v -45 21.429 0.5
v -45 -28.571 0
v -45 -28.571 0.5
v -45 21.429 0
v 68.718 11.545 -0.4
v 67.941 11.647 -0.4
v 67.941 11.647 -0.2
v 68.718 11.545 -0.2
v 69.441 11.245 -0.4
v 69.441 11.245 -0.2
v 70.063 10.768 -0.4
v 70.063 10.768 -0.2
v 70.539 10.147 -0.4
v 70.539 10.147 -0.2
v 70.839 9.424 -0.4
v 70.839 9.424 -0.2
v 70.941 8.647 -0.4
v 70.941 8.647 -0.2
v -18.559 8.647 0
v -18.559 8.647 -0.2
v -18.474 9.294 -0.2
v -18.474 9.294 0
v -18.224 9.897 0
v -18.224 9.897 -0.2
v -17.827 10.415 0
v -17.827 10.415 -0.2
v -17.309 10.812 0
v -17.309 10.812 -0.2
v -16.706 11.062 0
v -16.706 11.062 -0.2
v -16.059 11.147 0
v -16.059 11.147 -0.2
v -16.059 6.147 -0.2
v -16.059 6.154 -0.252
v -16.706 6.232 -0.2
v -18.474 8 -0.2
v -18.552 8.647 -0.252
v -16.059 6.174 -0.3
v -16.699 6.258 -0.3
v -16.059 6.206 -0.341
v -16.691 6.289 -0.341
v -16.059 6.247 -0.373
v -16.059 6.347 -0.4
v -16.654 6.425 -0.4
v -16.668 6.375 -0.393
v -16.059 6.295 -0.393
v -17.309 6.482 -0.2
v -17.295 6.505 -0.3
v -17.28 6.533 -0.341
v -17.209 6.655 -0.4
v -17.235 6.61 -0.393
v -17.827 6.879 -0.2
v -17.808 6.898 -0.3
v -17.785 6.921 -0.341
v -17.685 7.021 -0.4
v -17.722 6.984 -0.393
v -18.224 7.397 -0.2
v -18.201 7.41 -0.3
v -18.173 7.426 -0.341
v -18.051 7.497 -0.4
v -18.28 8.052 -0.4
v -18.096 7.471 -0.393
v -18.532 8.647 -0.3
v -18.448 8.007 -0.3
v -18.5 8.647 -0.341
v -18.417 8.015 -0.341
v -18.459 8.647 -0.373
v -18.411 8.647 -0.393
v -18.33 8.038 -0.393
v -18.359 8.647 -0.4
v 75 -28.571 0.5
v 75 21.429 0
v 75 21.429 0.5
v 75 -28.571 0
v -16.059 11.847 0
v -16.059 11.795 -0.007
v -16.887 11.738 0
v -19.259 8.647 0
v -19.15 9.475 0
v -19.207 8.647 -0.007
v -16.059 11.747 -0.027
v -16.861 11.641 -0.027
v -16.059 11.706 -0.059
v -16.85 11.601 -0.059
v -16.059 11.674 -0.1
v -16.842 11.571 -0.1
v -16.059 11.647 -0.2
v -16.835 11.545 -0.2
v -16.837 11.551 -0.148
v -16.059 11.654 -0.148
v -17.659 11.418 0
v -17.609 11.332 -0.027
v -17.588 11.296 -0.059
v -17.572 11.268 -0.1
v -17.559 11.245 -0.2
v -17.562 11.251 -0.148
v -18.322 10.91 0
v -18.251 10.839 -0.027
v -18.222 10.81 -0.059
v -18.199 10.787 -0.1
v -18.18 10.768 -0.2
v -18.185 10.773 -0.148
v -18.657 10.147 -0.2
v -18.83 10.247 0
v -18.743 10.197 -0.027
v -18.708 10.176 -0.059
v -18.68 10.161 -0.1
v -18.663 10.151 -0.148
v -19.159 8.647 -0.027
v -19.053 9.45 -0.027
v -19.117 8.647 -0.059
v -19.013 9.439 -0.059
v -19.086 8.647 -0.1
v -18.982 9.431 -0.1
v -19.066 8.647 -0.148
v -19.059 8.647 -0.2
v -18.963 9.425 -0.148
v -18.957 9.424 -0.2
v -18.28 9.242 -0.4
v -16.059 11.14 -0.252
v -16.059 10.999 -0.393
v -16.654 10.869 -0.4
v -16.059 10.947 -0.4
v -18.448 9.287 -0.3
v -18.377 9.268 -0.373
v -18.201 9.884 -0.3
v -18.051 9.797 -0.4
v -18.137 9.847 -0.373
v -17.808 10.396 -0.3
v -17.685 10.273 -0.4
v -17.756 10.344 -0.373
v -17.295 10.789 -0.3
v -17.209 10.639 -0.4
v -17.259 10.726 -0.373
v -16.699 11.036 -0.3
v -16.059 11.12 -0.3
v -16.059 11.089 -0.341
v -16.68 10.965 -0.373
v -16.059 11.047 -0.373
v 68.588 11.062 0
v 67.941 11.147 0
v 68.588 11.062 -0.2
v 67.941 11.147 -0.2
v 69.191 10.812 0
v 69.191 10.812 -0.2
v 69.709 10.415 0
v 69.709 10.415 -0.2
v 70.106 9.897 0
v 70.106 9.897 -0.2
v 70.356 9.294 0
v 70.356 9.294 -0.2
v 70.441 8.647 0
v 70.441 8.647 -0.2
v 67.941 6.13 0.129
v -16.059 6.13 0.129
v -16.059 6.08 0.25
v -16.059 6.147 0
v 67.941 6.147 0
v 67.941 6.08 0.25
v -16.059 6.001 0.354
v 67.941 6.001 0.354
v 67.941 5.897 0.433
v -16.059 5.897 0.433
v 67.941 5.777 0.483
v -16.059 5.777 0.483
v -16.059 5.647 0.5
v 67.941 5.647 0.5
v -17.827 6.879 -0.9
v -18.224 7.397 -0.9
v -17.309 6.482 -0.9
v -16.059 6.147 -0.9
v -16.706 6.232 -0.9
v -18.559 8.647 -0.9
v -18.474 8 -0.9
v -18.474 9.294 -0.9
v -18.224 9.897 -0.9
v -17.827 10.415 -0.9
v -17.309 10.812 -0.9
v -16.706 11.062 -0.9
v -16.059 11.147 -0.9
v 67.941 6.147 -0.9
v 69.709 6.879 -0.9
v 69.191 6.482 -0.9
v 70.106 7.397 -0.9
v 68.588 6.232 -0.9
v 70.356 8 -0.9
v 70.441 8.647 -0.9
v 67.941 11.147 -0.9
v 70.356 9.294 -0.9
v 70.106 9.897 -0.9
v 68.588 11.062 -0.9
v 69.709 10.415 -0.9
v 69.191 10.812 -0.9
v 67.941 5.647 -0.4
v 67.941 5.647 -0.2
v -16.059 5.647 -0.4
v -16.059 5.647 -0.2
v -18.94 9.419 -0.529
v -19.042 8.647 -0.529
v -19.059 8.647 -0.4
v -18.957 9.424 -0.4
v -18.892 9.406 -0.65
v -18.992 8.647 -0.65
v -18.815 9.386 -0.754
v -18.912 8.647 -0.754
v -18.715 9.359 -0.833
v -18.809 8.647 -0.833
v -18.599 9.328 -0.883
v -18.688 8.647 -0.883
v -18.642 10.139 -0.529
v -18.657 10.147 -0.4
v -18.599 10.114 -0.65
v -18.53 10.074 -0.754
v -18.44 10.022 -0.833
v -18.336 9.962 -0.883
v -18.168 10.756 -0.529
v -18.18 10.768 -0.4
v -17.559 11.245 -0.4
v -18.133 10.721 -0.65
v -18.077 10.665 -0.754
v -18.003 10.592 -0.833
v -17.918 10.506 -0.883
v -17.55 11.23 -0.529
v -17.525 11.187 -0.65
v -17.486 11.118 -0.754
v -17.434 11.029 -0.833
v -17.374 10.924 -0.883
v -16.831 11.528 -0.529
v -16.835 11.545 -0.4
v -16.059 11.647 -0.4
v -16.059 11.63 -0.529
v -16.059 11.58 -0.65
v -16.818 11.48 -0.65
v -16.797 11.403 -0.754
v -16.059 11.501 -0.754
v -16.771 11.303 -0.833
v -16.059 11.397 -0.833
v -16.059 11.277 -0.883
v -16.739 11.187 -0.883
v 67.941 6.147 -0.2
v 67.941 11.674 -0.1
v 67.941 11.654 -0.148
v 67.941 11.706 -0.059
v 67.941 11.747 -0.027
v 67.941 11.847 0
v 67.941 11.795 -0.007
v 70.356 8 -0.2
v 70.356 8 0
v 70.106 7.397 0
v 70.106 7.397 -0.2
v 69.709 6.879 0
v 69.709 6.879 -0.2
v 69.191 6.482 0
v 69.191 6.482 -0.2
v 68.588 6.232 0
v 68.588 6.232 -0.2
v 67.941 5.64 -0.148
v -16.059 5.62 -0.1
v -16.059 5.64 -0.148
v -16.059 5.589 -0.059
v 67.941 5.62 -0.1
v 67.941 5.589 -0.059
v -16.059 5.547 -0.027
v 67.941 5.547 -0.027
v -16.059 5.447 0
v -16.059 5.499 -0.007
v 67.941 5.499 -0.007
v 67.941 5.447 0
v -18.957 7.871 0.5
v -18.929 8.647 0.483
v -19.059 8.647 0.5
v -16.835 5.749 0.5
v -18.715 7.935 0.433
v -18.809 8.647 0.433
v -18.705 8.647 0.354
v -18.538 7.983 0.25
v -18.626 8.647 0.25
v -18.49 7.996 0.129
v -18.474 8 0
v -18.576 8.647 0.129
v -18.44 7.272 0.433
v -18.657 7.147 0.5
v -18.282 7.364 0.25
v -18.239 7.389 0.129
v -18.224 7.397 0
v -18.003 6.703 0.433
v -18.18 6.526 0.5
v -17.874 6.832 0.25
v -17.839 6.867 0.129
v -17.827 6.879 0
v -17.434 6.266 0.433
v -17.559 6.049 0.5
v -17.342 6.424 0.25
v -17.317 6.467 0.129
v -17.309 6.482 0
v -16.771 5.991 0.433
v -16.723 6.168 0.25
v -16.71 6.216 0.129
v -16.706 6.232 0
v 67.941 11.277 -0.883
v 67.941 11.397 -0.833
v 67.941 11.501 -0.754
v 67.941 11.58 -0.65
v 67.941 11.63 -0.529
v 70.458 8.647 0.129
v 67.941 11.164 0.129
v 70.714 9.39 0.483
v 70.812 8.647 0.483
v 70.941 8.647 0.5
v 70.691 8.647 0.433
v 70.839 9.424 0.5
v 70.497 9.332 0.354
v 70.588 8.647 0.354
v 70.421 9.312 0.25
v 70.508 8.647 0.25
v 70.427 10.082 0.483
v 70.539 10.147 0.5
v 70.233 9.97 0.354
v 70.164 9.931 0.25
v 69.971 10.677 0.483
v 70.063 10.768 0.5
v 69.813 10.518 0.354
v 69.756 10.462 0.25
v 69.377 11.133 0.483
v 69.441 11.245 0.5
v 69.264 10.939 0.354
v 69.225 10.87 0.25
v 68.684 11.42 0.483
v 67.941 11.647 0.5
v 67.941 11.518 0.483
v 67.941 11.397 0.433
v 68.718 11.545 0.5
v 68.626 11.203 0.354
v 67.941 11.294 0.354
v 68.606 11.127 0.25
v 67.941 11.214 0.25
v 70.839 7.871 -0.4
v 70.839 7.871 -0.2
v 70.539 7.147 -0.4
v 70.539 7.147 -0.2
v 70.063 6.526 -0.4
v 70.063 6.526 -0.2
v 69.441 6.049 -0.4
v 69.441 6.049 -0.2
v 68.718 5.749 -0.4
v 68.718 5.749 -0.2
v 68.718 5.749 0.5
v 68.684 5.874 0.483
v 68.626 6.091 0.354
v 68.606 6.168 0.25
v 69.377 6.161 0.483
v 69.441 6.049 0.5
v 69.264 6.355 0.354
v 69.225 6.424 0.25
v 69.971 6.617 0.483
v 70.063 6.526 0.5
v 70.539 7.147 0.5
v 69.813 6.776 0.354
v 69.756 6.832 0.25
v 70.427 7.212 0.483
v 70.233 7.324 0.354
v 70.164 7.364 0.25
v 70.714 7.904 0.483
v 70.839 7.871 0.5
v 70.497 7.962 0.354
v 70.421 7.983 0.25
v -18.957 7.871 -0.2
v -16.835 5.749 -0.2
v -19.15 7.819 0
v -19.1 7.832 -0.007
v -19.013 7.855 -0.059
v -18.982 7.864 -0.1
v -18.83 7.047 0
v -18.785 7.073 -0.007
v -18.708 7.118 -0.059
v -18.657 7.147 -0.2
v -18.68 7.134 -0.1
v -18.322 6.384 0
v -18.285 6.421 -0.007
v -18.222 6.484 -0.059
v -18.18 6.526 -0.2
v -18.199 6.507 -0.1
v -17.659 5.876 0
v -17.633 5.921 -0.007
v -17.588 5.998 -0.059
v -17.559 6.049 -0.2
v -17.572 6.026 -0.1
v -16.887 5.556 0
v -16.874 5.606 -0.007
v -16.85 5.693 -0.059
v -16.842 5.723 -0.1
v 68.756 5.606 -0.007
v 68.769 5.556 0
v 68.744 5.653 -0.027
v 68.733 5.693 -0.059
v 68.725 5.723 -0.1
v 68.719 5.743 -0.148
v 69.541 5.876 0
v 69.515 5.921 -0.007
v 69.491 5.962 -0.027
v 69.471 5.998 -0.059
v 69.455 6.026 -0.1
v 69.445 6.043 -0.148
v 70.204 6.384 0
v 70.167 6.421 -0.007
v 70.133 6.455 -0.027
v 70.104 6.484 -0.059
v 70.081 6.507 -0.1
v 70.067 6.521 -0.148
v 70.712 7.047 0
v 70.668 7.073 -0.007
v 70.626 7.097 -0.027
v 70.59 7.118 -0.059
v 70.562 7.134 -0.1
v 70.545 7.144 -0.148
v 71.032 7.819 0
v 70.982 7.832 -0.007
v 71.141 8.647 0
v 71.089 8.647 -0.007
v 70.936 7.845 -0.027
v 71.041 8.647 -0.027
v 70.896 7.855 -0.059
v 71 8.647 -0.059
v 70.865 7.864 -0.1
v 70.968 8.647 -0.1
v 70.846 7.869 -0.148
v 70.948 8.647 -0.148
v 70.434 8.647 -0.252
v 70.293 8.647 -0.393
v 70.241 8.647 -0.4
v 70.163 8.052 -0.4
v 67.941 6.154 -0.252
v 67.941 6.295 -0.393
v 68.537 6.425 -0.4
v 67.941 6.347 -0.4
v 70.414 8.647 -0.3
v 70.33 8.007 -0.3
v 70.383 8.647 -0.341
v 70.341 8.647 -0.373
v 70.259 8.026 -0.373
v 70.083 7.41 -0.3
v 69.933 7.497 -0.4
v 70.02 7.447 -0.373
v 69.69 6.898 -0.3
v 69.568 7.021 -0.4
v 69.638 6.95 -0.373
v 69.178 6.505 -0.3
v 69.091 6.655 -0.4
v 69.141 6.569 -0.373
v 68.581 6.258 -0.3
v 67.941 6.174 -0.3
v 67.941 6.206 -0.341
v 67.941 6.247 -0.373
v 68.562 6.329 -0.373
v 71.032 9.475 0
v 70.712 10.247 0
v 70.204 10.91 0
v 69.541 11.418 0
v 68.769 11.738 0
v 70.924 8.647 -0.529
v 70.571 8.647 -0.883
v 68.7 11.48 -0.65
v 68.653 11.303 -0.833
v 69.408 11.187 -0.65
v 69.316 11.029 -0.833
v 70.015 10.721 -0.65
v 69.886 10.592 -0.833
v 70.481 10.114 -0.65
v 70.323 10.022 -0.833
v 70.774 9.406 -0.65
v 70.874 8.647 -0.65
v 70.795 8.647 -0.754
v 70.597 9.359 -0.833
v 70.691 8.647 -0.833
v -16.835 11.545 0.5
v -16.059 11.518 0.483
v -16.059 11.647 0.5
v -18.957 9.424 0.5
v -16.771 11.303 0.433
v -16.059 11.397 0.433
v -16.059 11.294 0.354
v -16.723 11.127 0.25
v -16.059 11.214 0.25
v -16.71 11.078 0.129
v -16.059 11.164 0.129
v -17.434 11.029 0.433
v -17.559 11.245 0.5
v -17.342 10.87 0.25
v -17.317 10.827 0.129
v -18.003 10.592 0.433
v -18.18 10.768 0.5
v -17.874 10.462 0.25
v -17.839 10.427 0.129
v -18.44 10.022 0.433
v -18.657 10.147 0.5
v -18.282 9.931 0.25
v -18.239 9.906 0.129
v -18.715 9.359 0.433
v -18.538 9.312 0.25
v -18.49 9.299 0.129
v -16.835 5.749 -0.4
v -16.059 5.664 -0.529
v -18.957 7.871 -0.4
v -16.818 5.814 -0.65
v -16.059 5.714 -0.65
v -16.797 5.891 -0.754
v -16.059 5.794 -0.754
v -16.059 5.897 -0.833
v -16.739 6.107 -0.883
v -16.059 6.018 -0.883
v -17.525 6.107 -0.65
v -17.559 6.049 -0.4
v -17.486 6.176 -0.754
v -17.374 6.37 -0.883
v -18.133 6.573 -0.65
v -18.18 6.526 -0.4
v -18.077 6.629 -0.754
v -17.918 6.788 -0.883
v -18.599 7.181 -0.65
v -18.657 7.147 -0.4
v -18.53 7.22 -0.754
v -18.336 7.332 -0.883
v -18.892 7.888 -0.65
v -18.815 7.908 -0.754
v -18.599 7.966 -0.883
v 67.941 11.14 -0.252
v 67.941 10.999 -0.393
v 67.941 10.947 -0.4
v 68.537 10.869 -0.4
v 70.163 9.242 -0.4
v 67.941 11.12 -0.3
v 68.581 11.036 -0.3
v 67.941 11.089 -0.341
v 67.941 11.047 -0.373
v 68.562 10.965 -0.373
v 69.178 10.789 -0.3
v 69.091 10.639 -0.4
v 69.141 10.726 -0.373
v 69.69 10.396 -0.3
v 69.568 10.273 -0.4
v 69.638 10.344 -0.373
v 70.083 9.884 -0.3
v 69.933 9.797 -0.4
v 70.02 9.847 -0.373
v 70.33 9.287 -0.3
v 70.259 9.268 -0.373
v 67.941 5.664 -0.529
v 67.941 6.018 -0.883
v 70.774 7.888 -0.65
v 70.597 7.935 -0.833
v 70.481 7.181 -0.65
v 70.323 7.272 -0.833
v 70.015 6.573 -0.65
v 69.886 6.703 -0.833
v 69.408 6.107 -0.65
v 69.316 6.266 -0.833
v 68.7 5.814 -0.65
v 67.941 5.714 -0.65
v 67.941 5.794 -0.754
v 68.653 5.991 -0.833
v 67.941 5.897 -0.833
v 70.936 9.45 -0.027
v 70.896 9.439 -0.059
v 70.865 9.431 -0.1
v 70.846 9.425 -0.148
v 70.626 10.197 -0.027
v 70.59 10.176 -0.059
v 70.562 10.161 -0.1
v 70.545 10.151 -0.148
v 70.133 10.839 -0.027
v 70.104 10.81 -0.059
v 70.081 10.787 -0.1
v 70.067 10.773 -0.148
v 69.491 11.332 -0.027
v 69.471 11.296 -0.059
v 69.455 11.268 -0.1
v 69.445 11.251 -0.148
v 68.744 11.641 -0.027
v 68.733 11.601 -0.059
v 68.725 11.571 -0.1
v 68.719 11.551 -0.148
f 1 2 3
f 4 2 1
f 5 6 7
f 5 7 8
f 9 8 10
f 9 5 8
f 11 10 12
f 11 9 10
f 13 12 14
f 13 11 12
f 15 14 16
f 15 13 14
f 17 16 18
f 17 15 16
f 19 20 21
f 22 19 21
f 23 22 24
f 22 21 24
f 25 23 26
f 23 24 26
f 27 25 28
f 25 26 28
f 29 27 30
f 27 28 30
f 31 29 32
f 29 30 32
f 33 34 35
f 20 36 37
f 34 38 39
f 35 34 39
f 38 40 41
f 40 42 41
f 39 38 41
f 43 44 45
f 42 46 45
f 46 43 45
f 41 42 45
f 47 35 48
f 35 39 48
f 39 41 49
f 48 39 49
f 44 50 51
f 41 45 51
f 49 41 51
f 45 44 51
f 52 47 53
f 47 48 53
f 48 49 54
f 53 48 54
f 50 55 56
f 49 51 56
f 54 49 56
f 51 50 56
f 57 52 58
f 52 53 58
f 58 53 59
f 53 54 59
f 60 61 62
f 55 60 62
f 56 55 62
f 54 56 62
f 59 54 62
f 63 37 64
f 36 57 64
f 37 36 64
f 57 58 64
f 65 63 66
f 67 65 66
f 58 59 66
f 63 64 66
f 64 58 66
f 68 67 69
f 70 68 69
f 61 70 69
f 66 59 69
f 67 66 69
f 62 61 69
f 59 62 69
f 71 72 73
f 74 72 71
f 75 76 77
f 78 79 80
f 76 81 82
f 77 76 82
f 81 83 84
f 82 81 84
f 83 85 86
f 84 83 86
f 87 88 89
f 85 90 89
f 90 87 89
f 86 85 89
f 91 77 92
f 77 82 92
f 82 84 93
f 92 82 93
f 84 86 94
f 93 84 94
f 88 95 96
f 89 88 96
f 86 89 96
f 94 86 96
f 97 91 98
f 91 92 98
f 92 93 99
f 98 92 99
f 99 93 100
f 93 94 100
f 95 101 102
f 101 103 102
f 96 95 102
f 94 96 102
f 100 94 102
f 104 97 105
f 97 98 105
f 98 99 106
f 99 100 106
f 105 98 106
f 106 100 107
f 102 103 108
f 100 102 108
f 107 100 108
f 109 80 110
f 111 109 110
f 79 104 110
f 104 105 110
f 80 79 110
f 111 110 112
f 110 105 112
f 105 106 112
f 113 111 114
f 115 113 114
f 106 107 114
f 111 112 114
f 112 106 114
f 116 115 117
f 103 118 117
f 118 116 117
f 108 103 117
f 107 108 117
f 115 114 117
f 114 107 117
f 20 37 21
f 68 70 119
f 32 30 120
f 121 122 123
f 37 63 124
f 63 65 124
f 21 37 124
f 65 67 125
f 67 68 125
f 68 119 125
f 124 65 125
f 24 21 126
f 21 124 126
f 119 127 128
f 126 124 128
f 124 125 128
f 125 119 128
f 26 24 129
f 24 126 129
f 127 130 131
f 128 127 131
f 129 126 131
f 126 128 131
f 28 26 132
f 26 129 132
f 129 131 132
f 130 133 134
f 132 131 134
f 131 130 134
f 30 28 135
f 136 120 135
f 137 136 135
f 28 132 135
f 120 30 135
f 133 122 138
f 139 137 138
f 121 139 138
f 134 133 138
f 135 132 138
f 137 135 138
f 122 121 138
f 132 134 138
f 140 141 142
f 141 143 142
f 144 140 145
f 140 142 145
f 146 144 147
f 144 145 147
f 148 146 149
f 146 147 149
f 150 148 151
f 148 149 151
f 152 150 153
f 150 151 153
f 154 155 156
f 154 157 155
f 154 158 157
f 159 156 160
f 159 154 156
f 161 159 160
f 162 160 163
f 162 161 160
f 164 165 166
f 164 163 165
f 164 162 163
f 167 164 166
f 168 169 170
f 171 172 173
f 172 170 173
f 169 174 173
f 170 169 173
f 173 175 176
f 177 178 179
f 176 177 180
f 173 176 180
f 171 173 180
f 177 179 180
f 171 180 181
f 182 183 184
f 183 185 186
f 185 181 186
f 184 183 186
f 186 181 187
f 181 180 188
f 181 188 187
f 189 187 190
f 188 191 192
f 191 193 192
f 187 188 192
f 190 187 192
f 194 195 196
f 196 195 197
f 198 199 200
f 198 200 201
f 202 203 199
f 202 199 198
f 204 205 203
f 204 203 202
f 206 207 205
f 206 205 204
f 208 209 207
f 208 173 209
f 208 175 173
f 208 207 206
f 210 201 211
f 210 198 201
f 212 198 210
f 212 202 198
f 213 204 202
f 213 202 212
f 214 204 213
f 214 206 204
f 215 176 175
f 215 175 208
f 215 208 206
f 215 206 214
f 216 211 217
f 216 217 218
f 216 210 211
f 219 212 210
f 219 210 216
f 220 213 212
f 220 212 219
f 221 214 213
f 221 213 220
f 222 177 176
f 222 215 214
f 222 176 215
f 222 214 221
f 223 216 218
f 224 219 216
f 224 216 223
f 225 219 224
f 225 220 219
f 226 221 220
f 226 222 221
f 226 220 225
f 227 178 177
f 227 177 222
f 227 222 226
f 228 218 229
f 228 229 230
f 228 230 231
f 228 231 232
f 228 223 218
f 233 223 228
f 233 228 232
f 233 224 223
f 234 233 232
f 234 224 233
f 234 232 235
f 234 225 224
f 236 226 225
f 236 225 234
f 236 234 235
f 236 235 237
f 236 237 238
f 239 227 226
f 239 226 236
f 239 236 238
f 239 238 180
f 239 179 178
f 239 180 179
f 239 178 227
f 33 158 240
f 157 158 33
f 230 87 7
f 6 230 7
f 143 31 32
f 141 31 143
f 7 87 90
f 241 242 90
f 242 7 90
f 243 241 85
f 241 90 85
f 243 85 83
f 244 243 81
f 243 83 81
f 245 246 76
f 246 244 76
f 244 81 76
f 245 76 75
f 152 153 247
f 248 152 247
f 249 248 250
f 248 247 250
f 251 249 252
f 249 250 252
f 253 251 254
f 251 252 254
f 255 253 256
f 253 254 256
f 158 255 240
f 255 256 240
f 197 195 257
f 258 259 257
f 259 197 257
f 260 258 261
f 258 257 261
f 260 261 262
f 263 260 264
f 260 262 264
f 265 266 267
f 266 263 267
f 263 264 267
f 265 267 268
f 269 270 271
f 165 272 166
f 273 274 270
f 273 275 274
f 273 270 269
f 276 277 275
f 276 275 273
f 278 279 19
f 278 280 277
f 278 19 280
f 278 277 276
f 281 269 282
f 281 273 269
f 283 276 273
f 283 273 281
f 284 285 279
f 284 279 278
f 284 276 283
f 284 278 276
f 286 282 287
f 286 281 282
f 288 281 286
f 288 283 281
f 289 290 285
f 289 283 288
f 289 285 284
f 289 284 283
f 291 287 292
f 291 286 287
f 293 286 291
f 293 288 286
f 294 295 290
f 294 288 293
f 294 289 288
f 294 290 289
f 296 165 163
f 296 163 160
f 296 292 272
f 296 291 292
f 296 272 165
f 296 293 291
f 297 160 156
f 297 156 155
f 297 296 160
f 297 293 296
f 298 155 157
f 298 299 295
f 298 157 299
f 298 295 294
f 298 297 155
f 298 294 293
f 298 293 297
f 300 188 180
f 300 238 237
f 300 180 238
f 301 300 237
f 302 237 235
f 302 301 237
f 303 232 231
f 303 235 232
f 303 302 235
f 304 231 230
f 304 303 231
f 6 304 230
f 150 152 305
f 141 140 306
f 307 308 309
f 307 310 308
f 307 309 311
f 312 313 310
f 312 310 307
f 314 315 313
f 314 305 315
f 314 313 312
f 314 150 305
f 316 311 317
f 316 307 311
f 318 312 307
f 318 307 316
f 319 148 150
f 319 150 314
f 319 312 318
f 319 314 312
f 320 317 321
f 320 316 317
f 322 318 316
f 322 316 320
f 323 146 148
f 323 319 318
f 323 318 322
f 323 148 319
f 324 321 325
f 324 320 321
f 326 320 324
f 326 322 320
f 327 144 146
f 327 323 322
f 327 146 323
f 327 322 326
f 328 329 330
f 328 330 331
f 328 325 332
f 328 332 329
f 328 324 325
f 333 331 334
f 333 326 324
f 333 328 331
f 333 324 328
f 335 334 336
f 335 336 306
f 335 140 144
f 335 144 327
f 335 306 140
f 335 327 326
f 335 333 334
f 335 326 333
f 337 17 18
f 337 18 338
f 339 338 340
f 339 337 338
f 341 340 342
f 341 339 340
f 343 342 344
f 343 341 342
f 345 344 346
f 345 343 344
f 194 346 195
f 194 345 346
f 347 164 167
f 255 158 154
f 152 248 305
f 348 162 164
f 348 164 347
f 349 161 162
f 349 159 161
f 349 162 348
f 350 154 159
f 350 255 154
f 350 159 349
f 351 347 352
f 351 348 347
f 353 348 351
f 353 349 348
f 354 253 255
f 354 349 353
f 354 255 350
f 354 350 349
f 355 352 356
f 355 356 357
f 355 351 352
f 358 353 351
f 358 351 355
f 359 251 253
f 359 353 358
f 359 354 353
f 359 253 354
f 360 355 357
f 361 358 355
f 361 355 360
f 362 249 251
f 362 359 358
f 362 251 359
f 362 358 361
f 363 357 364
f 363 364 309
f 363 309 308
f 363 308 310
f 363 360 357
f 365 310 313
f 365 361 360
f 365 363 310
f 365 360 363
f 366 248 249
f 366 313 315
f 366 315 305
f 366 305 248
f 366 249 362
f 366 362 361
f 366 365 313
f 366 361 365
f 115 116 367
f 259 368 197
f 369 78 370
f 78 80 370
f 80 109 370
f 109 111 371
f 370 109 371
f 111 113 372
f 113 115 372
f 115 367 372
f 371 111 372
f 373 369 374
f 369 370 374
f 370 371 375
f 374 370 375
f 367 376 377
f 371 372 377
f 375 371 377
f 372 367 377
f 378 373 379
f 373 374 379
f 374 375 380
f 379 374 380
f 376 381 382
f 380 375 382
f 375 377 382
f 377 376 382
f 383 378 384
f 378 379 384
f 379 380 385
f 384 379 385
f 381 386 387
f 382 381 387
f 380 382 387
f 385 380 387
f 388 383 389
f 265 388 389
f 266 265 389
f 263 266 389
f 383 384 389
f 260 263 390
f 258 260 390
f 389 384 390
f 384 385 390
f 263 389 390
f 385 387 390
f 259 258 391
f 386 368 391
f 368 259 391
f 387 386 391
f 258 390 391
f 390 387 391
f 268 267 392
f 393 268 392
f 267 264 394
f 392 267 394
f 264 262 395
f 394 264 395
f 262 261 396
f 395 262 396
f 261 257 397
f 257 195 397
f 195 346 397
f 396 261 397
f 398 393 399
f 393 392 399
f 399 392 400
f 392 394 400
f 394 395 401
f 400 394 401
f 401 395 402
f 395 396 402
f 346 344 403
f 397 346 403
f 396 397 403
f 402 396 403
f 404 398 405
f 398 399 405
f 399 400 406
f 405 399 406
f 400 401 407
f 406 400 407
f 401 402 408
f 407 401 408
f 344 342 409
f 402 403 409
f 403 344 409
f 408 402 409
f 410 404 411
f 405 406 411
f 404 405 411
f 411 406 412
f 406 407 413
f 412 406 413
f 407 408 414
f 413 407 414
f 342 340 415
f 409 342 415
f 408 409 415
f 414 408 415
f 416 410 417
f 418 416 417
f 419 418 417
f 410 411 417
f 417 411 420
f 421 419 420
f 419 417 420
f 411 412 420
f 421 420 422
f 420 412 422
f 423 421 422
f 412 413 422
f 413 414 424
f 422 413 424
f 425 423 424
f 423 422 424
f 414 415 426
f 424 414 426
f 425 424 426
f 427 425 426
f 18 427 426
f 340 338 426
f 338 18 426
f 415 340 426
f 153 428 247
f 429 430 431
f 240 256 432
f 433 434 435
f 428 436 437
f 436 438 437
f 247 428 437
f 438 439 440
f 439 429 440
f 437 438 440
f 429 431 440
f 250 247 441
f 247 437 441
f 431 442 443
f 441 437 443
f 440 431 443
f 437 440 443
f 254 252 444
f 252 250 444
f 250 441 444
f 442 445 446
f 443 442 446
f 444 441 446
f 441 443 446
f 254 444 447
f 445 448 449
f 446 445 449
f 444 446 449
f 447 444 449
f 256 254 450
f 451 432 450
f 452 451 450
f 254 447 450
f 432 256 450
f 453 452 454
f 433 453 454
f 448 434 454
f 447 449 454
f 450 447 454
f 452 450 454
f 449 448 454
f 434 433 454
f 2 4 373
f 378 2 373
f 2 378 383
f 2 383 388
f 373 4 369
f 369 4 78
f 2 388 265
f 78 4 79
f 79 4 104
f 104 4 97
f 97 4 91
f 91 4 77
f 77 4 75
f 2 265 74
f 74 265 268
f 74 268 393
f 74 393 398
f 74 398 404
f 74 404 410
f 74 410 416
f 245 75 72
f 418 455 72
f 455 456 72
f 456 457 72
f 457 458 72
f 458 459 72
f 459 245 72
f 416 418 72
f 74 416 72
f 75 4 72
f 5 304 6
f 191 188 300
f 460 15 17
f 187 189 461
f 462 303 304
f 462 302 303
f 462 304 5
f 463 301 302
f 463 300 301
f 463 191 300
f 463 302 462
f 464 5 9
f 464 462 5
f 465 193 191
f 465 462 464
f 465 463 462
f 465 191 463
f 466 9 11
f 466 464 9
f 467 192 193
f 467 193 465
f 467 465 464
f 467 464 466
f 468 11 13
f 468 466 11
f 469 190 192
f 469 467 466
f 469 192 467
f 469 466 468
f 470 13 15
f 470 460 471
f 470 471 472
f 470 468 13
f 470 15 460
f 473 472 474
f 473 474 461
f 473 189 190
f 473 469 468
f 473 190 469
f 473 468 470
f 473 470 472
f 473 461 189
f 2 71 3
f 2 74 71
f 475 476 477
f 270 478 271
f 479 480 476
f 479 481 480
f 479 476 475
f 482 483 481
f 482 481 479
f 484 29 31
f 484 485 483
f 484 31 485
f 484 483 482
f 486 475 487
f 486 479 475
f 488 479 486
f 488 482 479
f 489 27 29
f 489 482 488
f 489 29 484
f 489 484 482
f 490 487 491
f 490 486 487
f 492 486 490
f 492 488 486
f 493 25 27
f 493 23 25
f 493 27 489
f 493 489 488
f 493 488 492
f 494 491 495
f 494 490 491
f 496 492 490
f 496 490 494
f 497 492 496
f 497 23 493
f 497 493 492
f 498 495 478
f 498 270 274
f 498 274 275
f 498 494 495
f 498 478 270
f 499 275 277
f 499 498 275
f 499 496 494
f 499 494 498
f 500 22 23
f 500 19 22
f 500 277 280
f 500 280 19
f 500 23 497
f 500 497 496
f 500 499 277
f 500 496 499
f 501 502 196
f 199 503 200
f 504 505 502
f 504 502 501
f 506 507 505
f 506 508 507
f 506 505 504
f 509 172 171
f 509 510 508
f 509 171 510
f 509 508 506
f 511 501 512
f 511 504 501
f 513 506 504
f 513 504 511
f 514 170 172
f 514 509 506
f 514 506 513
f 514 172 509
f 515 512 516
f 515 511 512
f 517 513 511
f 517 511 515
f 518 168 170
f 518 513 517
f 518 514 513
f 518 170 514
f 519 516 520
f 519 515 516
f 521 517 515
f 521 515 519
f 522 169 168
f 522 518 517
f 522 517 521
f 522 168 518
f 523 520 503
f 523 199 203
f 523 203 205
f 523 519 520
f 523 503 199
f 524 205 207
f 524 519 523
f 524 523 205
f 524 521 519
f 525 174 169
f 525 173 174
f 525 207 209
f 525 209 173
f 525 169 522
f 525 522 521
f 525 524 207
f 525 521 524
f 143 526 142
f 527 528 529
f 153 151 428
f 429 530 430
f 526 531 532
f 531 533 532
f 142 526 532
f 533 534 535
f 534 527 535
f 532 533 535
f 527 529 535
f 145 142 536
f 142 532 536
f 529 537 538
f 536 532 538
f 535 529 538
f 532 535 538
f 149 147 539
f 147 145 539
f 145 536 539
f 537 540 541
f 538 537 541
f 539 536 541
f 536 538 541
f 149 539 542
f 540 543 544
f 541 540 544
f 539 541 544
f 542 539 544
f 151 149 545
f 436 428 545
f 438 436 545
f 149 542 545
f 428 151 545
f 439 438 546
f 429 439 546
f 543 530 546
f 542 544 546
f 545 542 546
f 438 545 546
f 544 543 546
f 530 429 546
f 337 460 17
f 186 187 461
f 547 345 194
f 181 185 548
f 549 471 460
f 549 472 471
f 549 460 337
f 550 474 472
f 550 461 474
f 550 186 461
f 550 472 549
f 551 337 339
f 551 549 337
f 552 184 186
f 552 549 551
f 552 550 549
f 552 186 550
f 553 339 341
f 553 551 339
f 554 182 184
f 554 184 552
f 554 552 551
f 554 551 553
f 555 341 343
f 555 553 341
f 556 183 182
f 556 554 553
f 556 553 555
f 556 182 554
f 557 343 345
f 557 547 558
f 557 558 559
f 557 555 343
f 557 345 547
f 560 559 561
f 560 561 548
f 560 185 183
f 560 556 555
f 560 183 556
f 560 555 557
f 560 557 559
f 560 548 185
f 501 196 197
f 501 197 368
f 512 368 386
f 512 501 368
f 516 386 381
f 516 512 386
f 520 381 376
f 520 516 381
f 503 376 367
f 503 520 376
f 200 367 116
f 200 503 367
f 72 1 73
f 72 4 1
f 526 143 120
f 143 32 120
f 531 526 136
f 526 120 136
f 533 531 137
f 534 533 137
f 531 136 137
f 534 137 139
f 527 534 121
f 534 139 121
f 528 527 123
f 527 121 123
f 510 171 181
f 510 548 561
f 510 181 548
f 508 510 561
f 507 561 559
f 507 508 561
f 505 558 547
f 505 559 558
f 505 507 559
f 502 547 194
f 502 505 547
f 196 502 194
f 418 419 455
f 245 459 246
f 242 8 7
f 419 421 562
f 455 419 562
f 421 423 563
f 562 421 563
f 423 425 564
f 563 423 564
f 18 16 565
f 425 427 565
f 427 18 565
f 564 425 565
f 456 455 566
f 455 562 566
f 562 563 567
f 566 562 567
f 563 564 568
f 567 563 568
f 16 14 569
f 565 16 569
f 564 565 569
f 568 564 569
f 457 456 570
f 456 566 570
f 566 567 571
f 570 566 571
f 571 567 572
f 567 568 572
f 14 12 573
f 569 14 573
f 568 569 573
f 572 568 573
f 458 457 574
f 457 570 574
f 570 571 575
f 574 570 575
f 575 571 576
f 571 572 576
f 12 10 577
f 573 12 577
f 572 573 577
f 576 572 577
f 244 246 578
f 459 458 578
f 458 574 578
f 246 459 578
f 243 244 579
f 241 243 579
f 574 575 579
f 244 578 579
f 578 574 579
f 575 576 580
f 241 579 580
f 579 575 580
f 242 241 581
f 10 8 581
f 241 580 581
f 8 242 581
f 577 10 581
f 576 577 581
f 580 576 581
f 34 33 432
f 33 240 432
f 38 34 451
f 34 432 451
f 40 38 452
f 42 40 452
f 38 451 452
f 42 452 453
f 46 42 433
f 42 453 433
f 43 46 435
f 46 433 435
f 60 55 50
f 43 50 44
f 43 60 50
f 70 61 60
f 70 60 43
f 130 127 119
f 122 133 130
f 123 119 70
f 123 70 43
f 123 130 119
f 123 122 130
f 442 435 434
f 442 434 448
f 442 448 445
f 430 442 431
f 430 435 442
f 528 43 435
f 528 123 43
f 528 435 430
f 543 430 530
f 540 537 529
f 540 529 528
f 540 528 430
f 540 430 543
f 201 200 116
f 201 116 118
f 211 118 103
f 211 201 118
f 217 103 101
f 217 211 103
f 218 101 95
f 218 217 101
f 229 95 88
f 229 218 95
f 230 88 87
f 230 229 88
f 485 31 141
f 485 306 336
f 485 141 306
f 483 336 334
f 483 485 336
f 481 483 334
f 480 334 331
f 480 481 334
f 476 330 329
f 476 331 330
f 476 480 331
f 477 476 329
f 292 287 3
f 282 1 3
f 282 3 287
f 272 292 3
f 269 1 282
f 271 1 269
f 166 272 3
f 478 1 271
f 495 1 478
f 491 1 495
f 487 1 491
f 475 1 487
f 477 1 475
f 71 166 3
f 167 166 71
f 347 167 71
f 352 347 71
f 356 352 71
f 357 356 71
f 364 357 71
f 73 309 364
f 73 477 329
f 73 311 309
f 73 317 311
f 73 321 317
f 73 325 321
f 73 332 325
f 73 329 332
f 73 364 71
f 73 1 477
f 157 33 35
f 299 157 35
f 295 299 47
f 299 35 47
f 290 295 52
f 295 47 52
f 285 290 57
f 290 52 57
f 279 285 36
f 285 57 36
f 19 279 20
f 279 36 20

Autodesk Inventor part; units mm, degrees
ref_plane "YZ Plane" through (0, 0, 0) normal (1, 0, 0) x (0, 1, 0)
ref_plane "XZ Plane" through (0, 0, 0) normal (0, 1, 0) x (-1, 0, 0)
ref_plane "XY Plane" through (0, 0, 0) normal (0, 0, 1) x (1, 0, 0)
sketch "Sketch1" plane through (0, 0, 0) normal (0, 0, 1) x (1, 0, 0)
  line L0 (-45, 21.4286) -> (75, 21.4286)
  line L1 (75, 21.4286) -> (75, -28.5714)
  line L2 (75, -28.5714) -> (-45, -28.5714)
  line L3 (-45, -28.5714) -> (-45, 21.4286)
  point P0 (0, 0)
  dimension "d0" = 50
  dimension "d1" = 120
extrude "Plate1" add sketch "Sketch1" along normal blind 0.5
sketch "Sketch2" plane through (0, 0, 0.5) normal (0, 0, 1) x (1, 0, 0)
  line L0 (-19.0588, 11.6471) -> (70.9412, 11.6471)
  line L1 (70.9412, 11.6471) -> (70.9412, 5.6471)
  line L2 (70.9412, 5.6471) -> (-19.0588, 5.6471)
  line L3 (-19.0588, 5.6471) -> (-19.0588, 11.6471)
  point P0 (0, 0)
  point P1 (25.9412, 8.6471)
  dimension "LG_A" = 90
  dimension "LT_A" = 6
  dimension "d5" = 45
  dimension "d6" = 3
extrude "Extrusion1" add sketch "Sketch2" against normal blind 1.4
sketch "Sketch3" plane through (0, 0, 0.5) normal (0, 0, 1) x (1, 0, 0)
  line L0 (-19.0588, 5.6471) -> (-19.0588, 11.6471) projected
  line L1 (-19.0588, 11.6471) -> (70.9412, 11.6471) projected
  line L2 (70.9412, 11.6471) -> (70.9412, 5.6471) projected
  line L3 (70.9412, 5.6471) -> (-19.0588, 5.6471) projected
  line L4 (-18.5588, 11.1471) -> (70.4412, 11.1471)
  line L5 (70.4412, 11.1471) -> (70.4412, 6.1471)
  line L6 (70.4412, 6.1471) -> (-18.5588, 6.1471)
  line L7 (-18.5588, 6.1471) -> (-18.5588, 11.1471)
  point P0 (0, 0)
  dimension "d9" = 0.5
  dimension "d10" = 0.5
  dimension "d11" = 0.5
  dimension "d12" = 0.5
extrude "Extrusion2" cut sketch "Sketch3" against normal blind 0.9 contours L4 L5 L6 L7
fillet "Fillet1" radius 2.5 4 edges at (-18.5588, 6.1471, 0.05) (-18.5588, 11.1471, 0.05) (70.4412, 11.1471, 0.05) (70.4412, 6.1471, 0.05)
fillet "Fillet2" radius 3 4 edges at (70.9412, 11.6471, -0.45) (70.9412, 5.6471, -0.45) (-19.0588, 11.6471, -0.45) (-19.0588, 5.6471, -0.45)
fillet "Fillet3" radius 0.5 8 edges at (-18.1802, 10.7684, -0.9) (25.9412, 11.6471, -0.9) (70.0625, 10.7684, -0.9) (25.9412, 5.6471, -0.9) (69.709, 10.4149, 0.5) (25.9412, 6.1471, 0.5) (-17.8266, 6.8793, 0.5) (25.9412, 11.1471, 0.5)
fillet "Fillet4" radius 0.2 8 edges at (69.709, 10.4149, -0.4) (25.9412, 6.1471, -0.4) (-17.8266, 6.8793, -0.4) (25.9412, 11.1471, -0.4) (70.0625, 10.7684, 0) (25.9412, 11.6471, 0) (-18.1802, 10.7684, 0) (25.9412, 5.6471, 0)
equation "\"d5\" = 0.5 * LG_A"
equation "\"d6\" = 0.5 * LT_A"
equation "\"d9\" = Thickness"
equation "\"d10\" = Thickness"
equation "\"d11\" = Thickness"
equation "\"d12\" = Thickness"
equation "\"d2\" = Thickness"
equation "\"GapSize\" = Thickness"
equation "\"BendRadius\" = Thickness"
equation "\"MinimumRemnant\" = 2 * Thickness"
equation "\"BendReliefDepth\" = 0.5 * Thickness"
equation "\"BendReliefWidth\" = Thickness"
equation "\"CornerReliefSize\" = 4 * Thickness"
equation "\"JacobiRadiusSize\" = BendRadius"
equation "\"TransitionRadius\" = BendRadius"
equation "\"d15\" = 0.5 * LT_A - Thickness"
equation "\"d16\" = 0.5 * LT_A"
equation "\"d17\" = Thickness"
equation "\"Thickness\" = 0.5"
properties part number "Amb"
